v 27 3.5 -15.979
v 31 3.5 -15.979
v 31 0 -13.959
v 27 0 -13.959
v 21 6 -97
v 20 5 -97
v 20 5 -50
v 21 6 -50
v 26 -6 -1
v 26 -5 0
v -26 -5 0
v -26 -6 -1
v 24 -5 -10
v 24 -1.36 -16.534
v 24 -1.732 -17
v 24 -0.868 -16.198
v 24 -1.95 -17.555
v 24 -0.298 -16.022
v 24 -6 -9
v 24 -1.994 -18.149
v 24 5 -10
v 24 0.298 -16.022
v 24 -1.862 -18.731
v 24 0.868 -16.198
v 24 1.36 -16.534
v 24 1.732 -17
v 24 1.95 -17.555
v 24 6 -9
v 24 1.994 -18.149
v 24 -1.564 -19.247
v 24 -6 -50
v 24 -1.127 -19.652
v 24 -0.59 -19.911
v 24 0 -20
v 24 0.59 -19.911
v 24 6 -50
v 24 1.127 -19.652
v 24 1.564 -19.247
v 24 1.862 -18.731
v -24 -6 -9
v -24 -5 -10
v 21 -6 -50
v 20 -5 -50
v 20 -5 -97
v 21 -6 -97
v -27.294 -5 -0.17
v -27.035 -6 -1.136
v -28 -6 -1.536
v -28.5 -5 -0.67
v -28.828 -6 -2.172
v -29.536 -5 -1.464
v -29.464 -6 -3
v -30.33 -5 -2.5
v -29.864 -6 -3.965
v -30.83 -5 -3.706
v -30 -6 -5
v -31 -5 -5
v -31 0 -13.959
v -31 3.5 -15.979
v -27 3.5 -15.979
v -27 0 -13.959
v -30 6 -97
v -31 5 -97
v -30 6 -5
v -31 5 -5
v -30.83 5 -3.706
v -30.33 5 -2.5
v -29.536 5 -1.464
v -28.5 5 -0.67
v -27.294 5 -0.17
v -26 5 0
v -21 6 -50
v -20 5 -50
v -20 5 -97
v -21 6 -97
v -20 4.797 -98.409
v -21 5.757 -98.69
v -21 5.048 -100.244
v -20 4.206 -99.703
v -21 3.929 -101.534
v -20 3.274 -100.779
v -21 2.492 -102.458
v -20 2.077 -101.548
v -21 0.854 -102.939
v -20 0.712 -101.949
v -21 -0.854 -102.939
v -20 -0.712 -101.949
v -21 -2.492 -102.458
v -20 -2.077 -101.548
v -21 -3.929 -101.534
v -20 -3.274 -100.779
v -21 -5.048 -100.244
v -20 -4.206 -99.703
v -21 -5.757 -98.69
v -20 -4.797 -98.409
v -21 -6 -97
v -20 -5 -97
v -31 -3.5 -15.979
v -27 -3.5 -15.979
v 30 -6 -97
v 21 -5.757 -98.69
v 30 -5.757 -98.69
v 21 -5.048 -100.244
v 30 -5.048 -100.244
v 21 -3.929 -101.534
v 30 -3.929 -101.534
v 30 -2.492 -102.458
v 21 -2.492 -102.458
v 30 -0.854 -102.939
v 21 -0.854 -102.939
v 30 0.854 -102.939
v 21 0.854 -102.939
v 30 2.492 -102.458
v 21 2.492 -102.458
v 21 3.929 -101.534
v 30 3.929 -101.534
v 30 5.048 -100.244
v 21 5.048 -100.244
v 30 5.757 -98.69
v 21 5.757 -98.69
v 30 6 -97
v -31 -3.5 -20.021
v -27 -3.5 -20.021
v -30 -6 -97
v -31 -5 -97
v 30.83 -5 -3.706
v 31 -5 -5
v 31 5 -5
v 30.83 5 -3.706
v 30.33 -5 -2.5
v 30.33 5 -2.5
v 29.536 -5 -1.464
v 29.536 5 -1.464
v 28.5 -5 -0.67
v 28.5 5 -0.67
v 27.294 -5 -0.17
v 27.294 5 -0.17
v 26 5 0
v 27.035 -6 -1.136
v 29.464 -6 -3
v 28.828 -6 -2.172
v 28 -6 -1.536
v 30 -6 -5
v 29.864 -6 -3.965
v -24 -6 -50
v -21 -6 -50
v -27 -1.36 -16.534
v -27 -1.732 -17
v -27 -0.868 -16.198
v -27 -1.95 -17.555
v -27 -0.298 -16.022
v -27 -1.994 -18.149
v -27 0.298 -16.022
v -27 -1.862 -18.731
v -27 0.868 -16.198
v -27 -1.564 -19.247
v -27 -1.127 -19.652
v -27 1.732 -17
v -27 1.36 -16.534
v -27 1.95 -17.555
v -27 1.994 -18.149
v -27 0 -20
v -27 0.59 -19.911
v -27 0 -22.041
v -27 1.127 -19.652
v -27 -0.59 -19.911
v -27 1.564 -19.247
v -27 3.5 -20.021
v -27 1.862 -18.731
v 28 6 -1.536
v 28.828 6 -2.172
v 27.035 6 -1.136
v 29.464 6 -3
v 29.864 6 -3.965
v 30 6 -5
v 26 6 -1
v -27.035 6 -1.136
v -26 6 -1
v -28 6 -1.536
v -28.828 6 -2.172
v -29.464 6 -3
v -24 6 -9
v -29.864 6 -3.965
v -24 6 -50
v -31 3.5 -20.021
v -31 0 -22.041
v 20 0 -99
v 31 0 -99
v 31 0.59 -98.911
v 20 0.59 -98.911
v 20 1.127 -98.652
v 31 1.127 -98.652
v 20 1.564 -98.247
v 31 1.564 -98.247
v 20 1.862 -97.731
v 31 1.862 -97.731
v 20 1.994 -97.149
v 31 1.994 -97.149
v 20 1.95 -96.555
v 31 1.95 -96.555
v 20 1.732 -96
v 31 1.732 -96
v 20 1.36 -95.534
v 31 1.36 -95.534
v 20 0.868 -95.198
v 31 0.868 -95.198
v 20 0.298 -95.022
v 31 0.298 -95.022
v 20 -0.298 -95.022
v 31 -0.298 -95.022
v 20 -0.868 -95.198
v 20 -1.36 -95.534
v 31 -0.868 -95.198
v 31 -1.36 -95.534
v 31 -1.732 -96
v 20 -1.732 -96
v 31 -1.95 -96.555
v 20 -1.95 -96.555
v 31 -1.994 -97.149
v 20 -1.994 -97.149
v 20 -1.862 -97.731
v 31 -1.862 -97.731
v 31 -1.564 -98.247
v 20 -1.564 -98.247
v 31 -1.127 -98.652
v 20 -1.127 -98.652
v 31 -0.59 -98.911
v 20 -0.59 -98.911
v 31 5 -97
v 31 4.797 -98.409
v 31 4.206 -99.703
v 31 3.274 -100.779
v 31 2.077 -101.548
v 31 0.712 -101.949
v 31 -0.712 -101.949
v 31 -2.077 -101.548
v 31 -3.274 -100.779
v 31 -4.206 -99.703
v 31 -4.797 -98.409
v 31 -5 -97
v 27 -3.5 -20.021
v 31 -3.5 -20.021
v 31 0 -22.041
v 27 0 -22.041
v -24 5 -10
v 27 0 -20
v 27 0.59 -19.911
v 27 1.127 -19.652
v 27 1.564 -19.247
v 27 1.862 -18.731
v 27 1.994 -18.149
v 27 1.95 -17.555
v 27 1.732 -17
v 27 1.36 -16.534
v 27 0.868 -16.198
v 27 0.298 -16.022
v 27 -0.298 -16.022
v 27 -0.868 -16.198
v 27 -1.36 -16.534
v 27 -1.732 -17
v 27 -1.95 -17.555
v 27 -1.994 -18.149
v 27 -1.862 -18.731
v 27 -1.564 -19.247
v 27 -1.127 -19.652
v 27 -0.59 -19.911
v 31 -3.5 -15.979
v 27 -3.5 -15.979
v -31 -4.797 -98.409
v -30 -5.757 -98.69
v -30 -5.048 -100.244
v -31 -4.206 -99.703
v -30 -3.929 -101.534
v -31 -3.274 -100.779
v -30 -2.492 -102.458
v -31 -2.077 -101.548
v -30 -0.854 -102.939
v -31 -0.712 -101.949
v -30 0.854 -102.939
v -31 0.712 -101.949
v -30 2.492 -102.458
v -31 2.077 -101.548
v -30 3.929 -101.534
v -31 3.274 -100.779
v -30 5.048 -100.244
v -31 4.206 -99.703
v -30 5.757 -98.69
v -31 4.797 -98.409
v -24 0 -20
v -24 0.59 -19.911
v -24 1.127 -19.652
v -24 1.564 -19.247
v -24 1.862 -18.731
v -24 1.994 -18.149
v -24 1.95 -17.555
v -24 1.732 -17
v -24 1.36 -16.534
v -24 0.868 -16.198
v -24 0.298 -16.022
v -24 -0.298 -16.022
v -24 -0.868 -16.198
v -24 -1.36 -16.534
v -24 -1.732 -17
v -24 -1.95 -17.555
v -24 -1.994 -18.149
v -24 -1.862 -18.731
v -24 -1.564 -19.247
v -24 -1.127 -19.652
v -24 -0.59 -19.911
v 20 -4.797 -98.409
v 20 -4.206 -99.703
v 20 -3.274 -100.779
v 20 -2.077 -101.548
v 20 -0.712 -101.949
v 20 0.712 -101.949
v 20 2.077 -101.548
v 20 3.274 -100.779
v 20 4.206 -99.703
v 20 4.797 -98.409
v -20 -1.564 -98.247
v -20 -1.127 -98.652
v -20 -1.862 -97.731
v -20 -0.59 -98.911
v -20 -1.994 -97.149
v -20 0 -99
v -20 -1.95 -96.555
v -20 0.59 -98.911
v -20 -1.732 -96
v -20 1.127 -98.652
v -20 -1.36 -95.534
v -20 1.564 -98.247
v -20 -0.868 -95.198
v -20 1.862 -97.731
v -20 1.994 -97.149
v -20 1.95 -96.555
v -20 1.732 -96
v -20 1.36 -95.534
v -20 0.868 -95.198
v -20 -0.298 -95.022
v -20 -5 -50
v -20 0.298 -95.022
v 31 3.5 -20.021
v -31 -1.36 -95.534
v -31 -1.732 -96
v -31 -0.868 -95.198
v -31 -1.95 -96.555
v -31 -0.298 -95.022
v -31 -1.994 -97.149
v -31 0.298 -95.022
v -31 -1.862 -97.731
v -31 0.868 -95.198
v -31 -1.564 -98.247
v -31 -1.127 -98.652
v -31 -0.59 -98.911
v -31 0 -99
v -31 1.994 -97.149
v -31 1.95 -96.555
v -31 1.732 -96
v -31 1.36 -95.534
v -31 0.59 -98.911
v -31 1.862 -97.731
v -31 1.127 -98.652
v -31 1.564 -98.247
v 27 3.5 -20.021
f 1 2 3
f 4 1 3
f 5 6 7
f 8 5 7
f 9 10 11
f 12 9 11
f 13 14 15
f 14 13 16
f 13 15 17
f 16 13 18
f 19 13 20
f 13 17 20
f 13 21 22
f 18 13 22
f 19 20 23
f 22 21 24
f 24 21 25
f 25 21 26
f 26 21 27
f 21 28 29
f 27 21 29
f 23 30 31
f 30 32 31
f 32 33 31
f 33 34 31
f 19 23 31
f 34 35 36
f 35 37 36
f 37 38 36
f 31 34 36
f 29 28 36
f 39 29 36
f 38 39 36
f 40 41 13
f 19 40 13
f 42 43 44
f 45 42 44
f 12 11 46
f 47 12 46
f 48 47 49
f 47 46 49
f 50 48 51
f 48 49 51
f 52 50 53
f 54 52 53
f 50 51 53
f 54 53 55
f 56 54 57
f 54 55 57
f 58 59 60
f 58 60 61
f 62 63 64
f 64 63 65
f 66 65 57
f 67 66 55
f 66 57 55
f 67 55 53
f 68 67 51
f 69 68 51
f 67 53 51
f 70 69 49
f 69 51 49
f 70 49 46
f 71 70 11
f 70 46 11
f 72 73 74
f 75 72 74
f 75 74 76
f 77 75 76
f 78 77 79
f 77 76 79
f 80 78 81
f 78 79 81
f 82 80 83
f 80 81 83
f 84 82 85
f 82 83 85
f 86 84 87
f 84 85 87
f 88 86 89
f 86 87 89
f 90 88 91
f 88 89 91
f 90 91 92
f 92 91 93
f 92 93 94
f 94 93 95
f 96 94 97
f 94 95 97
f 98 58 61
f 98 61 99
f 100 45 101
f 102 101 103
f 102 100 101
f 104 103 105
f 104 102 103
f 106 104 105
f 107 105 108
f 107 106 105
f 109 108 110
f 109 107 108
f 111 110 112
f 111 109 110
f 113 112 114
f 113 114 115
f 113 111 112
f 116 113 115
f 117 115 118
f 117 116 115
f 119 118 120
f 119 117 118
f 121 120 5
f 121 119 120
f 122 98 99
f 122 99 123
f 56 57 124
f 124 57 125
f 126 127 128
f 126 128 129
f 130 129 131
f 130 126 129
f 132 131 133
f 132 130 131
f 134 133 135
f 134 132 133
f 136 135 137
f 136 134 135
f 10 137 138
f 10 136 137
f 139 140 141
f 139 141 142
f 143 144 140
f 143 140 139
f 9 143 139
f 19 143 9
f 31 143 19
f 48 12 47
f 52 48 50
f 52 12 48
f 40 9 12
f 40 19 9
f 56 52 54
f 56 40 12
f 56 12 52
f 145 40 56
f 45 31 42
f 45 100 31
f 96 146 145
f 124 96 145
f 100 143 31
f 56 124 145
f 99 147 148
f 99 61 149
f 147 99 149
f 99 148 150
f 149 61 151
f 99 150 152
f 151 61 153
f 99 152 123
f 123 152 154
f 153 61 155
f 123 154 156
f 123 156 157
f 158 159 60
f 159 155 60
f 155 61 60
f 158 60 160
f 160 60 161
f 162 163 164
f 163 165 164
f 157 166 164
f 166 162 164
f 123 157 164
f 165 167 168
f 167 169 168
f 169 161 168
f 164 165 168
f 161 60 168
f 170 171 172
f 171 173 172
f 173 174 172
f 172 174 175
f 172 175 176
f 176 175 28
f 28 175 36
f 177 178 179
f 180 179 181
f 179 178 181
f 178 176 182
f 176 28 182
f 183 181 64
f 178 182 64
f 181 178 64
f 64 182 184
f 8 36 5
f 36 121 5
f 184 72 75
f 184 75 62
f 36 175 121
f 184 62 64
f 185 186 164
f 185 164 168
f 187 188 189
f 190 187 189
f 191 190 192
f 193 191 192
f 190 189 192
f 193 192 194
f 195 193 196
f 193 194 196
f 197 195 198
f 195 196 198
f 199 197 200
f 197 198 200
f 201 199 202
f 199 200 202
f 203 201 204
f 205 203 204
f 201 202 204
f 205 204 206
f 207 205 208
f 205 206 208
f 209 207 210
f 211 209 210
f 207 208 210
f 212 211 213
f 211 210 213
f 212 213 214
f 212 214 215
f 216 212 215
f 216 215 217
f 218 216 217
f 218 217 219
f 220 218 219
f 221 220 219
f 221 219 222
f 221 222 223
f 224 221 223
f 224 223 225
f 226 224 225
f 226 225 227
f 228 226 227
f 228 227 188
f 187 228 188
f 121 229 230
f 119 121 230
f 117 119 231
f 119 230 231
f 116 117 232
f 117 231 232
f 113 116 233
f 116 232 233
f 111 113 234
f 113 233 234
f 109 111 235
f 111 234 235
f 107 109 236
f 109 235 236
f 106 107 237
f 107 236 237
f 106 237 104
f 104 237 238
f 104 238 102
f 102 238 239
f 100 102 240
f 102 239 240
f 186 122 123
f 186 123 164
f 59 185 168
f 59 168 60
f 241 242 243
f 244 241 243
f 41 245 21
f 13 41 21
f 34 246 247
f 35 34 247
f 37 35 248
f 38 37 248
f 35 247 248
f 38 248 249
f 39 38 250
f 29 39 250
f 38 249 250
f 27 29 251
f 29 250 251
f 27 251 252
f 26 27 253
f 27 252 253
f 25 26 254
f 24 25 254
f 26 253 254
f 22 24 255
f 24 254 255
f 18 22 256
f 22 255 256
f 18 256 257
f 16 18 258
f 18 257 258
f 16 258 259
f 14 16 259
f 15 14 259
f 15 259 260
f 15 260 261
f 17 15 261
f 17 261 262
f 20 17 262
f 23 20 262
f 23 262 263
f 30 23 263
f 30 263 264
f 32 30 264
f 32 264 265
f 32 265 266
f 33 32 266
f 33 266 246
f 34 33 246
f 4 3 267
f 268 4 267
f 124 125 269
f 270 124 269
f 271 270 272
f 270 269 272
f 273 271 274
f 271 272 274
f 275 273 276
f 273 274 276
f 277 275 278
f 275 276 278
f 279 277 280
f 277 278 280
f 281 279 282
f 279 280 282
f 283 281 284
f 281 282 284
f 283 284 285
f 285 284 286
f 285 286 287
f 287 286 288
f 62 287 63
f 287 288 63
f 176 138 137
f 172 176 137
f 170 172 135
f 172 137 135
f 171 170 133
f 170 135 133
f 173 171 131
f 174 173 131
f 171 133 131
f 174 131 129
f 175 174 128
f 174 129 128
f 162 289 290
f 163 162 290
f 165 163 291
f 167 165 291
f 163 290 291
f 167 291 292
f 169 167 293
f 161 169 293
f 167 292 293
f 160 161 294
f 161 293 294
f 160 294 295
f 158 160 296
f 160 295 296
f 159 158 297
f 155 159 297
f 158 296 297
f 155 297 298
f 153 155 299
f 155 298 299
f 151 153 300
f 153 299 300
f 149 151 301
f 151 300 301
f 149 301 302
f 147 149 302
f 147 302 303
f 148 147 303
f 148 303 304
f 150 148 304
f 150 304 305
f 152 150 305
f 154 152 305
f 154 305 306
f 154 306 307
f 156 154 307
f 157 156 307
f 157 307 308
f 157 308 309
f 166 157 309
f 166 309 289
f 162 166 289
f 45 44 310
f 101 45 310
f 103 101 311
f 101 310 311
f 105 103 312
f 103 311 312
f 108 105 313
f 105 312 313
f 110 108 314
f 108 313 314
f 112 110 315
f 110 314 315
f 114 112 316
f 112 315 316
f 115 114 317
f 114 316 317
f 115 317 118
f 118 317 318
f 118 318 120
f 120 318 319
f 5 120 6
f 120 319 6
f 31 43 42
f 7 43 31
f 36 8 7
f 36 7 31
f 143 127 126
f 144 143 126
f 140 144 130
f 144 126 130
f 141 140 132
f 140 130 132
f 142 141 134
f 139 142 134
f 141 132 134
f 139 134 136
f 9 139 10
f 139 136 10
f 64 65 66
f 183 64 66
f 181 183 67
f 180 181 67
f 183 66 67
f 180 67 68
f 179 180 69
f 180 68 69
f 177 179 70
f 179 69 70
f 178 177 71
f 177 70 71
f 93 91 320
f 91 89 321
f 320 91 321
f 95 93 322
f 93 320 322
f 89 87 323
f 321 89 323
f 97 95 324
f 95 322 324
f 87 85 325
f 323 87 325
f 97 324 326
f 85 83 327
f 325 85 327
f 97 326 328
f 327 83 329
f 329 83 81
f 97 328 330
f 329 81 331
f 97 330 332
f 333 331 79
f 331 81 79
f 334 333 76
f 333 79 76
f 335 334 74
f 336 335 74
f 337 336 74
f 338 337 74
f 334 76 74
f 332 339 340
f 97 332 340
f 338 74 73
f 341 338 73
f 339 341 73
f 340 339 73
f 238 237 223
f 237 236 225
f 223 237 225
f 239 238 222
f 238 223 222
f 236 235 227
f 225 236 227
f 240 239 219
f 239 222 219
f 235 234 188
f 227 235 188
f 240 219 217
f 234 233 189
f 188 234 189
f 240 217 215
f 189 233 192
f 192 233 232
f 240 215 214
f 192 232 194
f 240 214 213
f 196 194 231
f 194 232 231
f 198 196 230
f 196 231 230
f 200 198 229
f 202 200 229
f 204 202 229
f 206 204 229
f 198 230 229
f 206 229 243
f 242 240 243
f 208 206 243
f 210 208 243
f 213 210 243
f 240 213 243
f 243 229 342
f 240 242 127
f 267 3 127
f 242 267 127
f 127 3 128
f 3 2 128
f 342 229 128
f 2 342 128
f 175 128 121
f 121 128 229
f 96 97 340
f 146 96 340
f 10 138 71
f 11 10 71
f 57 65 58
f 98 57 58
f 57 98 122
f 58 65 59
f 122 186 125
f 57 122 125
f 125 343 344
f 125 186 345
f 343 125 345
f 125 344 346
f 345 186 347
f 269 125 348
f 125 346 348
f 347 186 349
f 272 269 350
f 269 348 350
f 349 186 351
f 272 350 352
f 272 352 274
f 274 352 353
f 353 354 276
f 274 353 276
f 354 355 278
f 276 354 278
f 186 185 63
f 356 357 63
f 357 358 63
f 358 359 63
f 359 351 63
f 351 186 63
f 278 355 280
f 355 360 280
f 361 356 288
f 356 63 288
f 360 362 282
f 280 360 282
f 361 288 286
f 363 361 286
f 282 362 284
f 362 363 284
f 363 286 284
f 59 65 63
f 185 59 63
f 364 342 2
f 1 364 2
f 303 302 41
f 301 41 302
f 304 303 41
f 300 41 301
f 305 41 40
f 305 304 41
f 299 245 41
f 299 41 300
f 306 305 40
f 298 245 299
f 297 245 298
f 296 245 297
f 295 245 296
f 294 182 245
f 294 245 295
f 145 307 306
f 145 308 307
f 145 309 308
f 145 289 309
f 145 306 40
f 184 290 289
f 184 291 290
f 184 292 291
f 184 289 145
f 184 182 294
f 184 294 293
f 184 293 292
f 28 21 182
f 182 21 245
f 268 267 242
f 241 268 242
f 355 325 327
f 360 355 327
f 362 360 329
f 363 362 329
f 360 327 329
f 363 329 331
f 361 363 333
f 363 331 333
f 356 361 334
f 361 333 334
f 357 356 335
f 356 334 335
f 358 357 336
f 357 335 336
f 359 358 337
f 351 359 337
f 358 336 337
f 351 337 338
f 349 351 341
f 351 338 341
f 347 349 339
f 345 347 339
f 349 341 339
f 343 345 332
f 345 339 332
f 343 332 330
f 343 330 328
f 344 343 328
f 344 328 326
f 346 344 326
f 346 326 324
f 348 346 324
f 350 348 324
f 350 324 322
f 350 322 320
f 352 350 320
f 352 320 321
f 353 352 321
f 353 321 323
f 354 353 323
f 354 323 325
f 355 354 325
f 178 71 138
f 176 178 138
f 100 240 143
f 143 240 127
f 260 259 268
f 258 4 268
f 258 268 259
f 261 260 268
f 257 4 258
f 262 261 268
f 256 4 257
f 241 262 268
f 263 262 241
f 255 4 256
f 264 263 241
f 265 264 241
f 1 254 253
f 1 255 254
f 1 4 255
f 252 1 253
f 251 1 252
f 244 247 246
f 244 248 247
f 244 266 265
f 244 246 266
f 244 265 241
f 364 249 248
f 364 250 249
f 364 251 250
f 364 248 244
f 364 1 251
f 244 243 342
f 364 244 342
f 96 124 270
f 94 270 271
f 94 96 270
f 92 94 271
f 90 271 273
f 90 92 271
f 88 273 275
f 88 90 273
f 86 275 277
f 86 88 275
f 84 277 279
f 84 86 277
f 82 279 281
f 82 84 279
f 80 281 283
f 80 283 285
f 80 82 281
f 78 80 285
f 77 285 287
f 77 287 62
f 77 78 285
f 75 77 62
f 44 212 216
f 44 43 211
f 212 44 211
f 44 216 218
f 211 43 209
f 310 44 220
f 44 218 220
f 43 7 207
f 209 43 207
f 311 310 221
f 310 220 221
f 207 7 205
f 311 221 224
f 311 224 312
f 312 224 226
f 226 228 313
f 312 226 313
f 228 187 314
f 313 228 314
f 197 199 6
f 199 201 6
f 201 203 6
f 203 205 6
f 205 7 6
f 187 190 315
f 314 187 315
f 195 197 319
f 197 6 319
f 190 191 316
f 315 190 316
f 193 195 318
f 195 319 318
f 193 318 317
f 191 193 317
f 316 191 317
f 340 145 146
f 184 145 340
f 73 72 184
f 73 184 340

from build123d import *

# Parameters (mm, degrees)
BOSS_EXTRUDE1_DEPTH = 6
SKETCH2_R           = 2
CUT_EXTRUDE1_DEPTH  = 121.370262108
SKETCH3_R           = 2
CUT_EXTRUDE2_DEPTH  = 121.370262108
CUT_EXTRUDE3_DEPTH  = 4
SKETCH6_W           = 48
SKETCH6_H           = 40
CUT_EXTRUDE4_DEPTH  = 109.231233939
FILLET1_R           = 5
CHAMFER1_SIZE       = 1


with BuildPart() as part:
    # Sketch1 → Boss-Extrude1 (new, symmetric)
    with BuildSketch(Plane(origin=(0, 0, 0), x_dir=(1, 0, 0), z_dir=(0, 1, 0))):
        Polygon((20, 103), (31, 103), (31, 0), (-31, 0), (-31, 103), (-20, 103), (-20, 10), (20, 10), align=None)
    extrude(amount=BOSS_EXTRUDE1_DEPTH, both=True)

    # Sketch2 → Cut-Extrude1 (cut, through all)
    with BuildSketch(Plane(origin=(31, 0, 0), x_dir=(0, 0, -1), z_dir=(1, 0, 0))):
        with Locations((97, 0)):
            Circle(SKETCH2_R)
        with BuildLine():
            Line((97, 6), (104, 6))
            Line((104, 6), (104, -6))
            Line((104, -6), (97, -6))
            ThreePointArc((97, -6), (103, 0), (97, 6))
        make_face()
    extrude(amount=-CUT_EXTRUDE1_DEPTH, mode=Mode.SUBTRACT)

    # Sketch3 → Cut-Extrude2 (cut, through all)
    with BuildSketch(Plane(origin=(31, 0, 0), x_dir=(0, 0, -1), z_dir=(1, 0, 0))):
        with Locations((18, 0)):
            Circle(SKETCH3_R)
    extrude(amount=-CUT_EXTRUDE2_DEPTH, mode=Mode.SUBTRACT)

    # Sketch4 → Cut-Extrude3 (cut)
    with BuildSketch(Plane(origin=(31, 0, 0), x_dir=(0, 0, -1), z_dir=(1, 0, 0))):
        Polygon((22.041451884, 0), (20.020725942, 3.5), (15.979274058, 3.5), (13.958548116, 0), (15.979274058, -3.5), (20.020725942, -3.5), align=None)
    cut_extrude3 = extrude(amount=-CUT_EXTRUDE3_DEPTH, mode=Mode.SUBTRACT)

    # Mirror1: Cut-Extrude3 across plane
    add(cut_extrude3.mirror(Plane(origin=(0, 0, 0), x_dir=(0, 0, 1), z_dir=(1, 0, 0))), mode=Mode.SUBTRACT)

    # Sketch6 → Cut-Extrude4 (cut, through all)
    with BuildSketch(Plane(origin=(0, 6, 0), x_dir=(1, 0, 0), z_dir=(0, 1, 0))):
        with Locations((0, 30)):
            Rectangle(SKETCH6_W, SKETCH6_H)
    extrude(amount=-CUT_EXTRUDE4_DEPTH, mode=Mode.SUBTRACT)

    # Fillet1
    fillet1_edges = [part.edges().sort_by_distance(p)[0] for p in [
        (31, 0, 0),
        (-31, 0, 0),
    ]]
    fillet(fillet1_edges, radius=FILLET1_R)

    # Chamfer1
    chamfer1_edges = [part.edges().sort_by_distance(p)[0] for p in [
        (-20, -6, -73.5),
        (-20, 6, -73.5),
        (0, -6, 0),
        (0, 6, 0),
        (31, -6, -51),
        (29.535533906, -6, -1.464466094),
        (-29.535533906, -6, -1.464466094),
        (31, 6, -51),
        (29.535533906, 6, -1.464466094),
        (-29.535533906, 6, -1.464466094),
        (0, 6, -10),
        (-31, -6, -51),
        (20, -6, -73.5),
        (-31, 6, -51),
        (20, 6, -73.5),
        (20, 0, -103),
        (-20, 0, -103),
        (-31, 0, -103),
        (31, 0, -103),
        (0, -6, -10),
    ]]
    chamfer(chamfer1_edges, length=CHAMFER1_SIZE)


solid = part.part
